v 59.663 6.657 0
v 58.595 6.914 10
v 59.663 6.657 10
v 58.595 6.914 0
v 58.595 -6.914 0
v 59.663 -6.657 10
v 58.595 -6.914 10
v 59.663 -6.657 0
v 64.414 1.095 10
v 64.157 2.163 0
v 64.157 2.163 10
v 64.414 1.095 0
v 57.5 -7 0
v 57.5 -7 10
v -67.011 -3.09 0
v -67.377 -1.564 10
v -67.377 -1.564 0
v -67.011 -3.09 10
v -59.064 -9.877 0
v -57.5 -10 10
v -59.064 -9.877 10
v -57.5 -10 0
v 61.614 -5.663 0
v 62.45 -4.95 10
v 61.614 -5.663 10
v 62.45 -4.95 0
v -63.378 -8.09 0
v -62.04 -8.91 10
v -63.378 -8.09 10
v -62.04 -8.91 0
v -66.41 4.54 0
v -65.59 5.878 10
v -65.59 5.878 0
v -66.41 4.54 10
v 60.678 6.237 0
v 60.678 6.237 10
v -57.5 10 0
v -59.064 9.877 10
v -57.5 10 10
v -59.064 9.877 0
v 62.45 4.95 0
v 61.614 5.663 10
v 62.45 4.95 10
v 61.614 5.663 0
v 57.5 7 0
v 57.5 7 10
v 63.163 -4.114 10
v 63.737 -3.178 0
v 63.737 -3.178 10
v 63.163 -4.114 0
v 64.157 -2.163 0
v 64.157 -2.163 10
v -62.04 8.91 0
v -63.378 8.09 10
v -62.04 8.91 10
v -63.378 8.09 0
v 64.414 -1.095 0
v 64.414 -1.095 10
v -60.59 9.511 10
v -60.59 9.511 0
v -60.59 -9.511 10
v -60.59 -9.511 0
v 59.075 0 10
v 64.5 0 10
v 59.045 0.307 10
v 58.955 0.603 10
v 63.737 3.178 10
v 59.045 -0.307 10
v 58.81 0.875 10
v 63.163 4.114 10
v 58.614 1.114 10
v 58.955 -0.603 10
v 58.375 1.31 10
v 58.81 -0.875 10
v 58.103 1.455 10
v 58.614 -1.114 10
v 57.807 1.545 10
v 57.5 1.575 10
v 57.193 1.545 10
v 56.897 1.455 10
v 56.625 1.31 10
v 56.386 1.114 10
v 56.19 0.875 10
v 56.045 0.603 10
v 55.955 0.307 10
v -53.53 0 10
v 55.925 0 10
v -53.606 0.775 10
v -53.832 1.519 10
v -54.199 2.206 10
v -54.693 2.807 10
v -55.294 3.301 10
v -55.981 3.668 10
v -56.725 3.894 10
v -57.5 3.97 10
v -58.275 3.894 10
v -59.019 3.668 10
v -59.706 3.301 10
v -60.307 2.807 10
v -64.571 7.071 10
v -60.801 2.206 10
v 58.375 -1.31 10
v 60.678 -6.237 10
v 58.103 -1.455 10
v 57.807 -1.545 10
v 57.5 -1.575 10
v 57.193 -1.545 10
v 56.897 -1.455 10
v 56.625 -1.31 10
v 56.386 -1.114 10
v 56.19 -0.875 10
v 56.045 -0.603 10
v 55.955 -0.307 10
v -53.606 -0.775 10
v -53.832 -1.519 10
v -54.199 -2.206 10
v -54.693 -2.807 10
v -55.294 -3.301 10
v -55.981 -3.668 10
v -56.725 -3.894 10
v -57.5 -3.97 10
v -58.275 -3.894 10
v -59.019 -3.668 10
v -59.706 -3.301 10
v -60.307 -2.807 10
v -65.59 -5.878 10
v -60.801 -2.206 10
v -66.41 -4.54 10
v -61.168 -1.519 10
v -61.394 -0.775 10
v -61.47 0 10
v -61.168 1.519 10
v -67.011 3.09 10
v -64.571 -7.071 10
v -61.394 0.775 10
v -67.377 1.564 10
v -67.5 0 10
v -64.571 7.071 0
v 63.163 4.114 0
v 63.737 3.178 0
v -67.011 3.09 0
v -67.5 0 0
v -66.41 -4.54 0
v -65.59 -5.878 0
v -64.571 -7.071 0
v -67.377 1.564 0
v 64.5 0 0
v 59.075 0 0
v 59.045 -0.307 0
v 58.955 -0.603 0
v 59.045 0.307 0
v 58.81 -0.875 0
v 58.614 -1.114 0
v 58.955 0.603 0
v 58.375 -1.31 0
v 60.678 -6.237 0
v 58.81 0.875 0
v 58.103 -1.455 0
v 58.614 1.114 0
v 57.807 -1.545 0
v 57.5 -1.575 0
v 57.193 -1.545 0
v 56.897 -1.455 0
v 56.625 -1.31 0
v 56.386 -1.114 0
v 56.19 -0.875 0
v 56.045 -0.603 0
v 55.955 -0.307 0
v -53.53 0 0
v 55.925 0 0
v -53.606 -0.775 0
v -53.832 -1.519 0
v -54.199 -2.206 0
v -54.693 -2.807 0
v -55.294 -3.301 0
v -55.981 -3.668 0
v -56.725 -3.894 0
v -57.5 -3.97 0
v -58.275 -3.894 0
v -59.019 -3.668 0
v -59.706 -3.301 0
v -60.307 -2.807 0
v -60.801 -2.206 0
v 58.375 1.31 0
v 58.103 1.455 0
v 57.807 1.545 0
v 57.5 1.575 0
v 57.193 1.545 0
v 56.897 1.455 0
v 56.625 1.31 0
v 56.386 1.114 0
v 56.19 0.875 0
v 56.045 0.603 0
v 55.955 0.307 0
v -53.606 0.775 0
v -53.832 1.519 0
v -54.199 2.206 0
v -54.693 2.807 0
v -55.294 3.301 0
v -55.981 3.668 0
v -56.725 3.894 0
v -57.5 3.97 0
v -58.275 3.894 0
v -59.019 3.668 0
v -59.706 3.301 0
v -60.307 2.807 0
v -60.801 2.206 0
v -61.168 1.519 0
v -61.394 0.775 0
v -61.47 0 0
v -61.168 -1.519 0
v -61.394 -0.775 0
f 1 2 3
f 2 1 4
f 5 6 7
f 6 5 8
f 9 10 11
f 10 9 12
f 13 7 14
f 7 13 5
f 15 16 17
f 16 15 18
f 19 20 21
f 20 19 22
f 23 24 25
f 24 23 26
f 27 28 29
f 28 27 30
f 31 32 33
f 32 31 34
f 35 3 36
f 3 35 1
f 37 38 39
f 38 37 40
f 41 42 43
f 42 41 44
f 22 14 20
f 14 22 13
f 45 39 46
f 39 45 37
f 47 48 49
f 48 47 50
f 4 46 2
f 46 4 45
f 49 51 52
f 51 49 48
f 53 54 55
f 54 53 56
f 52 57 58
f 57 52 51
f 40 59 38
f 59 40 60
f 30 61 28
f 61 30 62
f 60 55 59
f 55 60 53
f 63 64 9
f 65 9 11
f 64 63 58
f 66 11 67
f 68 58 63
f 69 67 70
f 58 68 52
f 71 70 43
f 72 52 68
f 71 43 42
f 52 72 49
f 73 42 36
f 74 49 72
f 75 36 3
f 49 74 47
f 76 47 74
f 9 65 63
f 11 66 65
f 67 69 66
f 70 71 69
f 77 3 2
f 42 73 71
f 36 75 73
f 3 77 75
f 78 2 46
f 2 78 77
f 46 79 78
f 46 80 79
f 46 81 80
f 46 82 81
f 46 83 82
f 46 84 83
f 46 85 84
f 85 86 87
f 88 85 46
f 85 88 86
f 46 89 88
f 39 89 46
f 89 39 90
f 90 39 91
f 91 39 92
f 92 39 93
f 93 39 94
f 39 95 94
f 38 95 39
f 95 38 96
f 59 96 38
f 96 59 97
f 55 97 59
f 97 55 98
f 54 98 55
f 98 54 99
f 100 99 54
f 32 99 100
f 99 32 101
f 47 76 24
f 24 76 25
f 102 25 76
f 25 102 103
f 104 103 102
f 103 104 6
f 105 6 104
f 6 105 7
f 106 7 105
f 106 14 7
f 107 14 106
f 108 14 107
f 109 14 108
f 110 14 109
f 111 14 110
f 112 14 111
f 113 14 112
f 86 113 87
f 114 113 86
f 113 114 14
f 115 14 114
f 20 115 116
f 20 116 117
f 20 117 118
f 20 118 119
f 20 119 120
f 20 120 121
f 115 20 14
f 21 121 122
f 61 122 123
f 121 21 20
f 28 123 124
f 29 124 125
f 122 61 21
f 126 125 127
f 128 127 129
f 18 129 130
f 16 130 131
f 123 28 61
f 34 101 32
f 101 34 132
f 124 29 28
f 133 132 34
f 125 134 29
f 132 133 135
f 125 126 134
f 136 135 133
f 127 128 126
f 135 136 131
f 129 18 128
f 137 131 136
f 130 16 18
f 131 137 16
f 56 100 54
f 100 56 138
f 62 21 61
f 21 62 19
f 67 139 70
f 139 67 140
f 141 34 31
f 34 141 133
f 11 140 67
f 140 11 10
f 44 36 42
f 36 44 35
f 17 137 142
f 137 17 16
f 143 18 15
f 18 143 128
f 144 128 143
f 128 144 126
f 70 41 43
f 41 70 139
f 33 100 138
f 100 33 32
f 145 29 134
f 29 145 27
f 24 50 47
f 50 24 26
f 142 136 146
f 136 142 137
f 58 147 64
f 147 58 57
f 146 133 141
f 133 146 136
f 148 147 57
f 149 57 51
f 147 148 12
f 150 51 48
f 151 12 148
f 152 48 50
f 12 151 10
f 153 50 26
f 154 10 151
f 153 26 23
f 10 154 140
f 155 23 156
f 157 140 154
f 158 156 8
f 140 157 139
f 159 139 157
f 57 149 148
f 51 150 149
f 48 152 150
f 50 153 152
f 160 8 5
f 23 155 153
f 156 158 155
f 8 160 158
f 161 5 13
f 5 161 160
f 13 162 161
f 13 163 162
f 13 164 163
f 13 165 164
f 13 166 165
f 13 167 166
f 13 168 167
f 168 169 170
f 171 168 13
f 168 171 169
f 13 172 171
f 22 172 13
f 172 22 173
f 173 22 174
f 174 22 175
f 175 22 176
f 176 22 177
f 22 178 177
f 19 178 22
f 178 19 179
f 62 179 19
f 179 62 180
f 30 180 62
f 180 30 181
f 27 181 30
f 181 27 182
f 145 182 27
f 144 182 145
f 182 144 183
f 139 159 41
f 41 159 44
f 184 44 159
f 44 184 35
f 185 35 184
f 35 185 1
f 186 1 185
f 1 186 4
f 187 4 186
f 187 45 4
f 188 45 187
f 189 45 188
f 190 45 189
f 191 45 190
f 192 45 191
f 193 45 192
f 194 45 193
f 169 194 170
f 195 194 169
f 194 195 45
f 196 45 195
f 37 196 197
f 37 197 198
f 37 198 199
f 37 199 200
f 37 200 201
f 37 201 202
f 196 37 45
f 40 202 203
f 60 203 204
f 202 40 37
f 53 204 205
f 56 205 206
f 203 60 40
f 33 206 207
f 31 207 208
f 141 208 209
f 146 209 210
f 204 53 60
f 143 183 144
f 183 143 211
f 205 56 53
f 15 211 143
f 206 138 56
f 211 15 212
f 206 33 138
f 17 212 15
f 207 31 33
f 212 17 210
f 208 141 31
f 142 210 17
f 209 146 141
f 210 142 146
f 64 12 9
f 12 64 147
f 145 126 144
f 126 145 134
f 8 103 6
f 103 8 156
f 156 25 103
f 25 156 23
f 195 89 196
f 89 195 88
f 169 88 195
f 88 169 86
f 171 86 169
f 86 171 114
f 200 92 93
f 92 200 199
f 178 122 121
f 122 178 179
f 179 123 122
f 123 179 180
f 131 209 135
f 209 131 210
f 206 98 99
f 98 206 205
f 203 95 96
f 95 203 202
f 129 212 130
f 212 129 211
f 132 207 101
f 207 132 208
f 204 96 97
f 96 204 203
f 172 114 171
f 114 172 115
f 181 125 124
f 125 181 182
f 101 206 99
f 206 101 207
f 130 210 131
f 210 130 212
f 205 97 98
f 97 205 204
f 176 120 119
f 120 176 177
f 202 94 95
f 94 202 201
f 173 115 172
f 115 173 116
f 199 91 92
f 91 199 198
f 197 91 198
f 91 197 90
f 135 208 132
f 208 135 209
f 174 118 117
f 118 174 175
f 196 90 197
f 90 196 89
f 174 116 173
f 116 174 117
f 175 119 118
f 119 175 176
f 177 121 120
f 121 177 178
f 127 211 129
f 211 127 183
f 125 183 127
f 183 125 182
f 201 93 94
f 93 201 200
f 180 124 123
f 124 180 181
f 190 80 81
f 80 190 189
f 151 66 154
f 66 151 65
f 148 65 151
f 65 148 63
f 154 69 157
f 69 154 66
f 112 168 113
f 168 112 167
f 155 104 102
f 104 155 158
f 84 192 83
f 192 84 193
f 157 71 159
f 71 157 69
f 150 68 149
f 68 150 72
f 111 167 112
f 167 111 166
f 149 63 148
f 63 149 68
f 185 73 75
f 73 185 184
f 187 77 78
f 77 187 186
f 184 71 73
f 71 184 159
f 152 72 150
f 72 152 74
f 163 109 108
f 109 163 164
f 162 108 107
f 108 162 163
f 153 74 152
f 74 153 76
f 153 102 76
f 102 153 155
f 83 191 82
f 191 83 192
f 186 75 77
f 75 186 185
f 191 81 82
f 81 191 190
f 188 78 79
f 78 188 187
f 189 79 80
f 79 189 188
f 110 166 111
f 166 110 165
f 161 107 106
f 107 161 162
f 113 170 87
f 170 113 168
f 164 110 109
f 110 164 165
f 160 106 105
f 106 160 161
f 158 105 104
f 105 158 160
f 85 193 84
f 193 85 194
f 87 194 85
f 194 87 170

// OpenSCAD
$fn = 32;

// ----------------------------------------------------------------------
// Lever: 115 mm between the bosses, 10 mm thick, smooth outline
// ----------------------------------------------------------------------

// --- parameters (mm) ---
lever_l = 115;            // distance between the boss centres
boss_a = 20;              // first boss diameter
boss_b = 14;              // second boss diameter
bore_a = 7.94;            // first bore
bore_b = 3.15;            // second bore
lever_t = 10;             // lever thickness

lever_profile = [[-67.5, 0], [-67.377, -1.564], [-67.011, -3.09], [-66.41, -4.54], [-65.59, -5.878], [-64.571, -7.071], [-63.378, -8.09], [-62.04, -8.91], [-60.59, -9.511], [-59.064, -9.877], [-57.5, -10], [57.5, -7], [58.595, -6.914], [59.663, -6.657], [60.678, -6.237], [61.614, -5.663], [62.45, -4.95], [63.163, -4.114], [63.737, -3.178], [64.157, -2.163], [64.414, -1.095], [64.5, 0], [64.414, 1.095], [64.157, 2.163], [63.737, 3.178], [63.163, 4.114], [62.45, 4.95], [61.614, 5.663], [60.678, 6.237], [59.663, 6.657], [58.595, 6.914], [57.5, 7], [-57.5, 10], [-59.064, 9.877], [-60.59, 9.511], [-62.04, 8.91], [-63.378, 8.09], [-64.571, 7.071], [-65.59, 5.878], [-66.41, 4.54], [-67.011, 3.09], [-67.377, 1.564]];

difference() {
  linear_extrude(height = lever_t) polygon(lever_profile);
  translate([-57.5, 0, -2.5]) cylinder(h = lever_t + 5, d = bore_a);
  translate([57.5, 0, -2.5]) cylinder(h = lever_t + 5, d = bore_b);
}
